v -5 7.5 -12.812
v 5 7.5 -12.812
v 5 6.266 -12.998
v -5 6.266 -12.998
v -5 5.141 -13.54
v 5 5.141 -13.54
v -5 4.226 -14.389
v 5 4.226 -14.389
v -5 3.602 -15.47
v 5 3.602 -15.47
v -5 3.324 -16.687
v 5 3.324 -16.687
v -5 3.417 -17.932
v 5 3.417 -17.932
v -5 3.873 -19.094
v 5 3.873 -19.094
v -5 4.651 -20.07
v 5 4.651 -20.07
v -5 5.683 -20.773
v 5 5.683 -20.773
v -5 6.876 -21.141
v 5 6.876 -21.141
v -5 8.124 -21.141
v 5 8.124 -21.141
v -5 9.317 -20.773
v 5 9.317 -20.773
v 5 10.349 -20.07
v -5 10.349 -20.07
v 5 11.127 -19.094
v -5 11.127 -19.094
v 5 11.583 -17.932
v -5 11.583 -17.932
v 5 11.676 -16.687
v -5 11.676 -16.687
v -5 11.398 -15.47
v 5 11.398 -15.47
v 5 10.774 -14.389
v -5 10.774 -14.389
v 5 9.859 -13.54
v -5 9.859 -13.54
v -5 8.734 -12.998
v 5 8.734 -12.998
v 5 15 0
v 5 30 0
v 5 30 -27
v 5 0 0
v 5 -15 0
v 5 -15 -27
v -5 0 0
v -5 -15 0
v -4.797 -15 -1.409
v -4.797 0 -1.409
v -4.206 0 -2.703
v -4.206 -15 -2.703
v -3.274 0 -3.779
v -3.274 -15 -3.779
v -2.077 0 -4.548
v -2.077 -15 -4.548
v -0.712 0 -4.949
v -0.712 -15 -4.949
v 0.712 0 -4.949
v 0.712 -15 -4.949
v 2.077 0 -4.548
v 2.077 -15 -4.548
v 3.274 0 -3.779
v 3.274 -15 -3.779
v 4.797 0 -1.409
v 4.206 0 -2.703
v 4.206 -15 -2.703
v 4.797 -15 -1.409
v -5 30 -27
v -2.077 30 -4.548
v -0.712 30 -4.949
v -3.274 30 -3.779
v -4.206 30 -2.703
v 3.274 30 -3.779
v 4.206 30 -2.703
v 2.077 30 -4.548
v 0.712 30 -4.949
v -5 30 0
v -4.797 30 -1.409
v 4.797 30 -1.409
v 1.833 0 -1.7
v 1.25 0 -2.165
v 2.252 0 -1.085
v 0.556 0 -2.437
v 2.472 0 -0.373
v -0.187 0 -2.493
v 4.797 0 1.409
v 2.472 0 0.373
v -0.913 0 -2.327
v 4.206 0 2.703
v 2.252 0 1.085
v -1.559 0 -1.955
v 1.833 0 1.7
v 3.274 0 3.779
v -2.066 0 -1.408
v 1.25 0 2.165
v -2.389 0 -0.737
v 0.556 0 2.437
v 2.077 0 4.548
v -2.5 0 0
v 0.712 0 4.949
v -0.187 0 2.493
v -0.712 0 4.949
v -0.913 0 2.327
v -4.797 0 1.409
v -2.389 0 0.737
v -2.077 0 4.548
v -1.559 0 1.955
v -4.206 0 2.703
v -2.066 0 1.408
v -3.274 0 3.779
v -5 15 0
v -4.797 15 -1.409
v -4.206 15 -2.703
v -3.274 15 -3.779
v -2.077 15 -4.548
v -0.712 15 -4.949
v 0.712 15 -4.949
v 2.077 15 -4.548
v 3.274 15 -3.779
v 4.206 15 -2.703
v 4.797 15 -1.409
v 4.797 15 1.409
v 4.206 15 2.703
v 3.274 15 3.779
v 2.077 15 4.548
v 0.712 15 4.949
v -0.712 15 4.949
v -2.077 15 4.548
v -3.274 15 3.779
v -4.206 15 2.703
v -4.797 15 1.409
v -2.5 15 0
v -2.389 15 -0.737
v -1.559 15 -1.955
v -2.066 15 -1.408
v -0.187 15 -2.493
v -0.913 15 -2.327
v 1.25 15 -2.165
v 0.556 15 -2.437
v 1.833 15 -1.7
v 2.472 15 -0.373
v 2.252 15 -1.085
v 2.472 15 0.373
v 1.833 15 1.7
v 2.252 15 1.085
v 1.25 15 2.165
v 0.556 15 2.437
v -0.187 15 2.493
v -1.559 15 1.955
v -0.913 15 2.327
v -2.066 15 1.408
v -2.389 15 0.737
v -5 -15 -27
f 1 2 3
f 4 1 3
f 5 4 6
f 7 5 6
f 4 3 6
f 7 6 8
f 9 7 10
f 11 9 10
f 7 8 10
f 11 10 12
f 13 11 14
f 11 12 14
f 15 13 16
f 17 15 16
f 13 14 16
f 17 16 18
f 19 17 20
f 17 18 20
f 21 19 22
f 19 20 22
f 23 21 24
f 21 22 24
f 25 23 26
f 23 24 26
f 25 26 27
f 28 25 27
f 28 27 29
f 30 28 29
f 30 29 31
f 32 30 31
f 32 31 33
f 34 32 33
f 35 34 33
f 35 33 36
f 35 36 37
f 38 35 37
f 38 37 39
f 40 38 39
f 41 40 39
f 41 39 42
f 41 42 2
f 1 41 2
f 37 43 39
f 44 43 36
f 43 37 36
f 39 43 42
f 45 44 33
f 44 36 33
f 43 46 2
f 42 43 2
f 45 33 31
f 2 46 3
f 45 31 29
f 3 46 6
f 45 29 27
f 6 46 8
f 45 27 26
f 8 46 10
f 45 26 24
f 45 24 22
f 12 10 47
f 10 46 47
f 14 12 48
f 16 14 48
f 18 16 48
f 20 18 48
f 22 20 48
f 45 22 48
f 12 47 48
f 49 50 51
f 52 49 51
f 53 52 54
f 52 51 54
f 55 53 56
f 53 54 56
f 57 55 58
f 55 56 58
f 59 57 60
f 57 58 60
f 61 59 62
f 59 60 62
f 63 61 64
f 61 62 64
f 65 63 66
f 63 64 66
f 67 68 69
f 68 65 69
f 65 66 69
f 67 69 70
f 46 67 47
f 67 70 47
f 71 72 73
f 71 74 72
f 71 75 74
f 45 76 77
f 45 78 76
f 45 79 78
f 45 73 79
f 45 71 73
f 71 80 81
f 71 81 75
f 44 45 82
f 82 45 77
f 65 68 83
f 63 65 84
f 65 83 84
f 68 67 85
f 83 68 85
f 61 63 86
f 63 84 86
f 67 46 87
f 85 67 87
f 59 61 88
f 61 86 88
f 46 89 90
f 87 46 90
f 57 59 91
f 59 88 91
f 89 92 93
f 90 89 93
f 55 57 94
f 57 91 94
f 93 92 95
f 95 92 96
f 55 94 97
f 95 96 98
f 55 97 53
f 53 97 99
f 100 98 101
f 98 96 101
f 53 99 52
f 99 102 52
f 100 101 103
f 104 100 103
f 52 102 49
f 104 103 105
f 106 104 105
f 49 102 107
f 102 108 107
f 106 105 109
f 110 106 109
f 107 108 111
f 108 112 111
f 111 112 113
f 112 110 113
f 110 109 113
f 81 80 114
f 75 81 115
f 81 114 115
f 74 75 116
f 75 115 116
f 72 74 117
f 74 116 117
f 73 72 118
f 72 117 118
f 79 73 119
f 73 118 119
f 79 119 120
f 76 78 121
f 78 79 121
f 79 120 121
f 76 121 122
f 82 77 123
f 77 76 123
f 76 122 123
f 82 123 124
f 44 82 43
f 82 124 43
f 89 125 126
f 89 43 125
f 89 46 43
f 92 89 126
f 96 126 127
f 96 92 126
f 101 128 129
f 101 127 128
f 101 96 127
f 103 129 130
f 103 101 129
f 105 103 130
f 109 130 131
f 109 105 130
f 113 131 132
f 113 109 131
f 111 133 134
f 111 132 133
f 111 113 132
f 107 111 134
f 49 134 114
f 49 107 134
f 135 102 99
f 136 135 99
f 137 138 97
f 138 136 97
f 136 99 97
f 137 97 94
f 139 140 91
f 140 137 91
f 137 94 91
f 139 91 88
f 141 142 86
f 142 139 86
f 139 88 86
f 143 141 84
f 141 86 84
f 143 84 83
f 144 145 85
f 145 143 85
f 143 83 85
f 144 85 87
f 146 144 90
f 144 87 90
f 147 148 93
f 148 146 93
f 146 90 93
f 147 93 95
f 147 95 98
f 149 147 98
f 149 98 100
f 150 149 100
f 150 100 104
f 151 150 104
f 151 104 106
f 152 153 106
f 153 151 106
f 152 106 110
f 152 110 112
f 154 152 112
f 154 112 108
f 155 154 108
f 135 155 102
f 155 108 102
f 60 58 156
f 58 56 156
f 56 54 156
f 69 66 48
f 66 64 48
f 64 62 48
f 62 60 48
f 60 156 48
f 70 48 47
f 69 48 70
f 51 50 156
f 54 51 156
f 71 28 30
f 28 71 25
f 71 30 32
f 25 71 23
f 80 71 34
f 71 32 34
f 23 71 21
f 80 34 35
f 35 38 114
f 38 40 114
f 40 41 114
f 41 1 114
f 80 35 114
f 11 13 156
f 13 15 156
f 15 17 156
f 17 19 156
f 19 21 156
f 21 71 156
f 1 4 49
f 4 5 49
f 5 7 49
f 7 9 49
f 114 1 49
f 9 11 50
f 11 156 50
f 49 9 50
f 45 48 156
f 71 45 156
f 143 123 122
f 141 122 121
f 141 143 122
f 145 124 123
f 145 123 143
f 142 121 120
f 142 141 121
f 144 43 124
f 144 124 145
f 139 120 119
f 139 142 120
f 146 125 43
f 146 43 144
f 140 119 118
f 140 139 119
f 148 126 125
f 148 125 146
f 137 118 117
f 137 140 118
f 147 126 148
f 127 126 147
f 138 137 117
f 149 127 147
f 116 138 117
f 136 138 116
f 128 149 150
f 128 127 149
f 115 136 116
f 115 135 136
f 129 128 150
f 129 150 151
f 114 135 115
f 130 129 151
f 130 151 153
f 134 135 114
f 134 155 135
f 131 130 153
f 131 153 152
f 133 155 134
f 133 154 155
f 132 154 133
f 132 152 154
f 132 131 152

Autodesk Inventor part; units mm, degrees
ref_plane "YZ Plane" through (0, 0, 0) normal (1, 0, 0) x (0, 1, 0)
ref_plane "XZ Plane" through (0, 0, 0) normal (0, 1, 0) x (-1, 0, 0)
ref_plane "XY Plane" through (0, 0, 0) normal (0, 0, 1) x (1, 0, 0)
sketch "草图1" plane through (0, 0, 0) normal (0, 1, 0) x (-1, 0, 0)
  circle A0 centre (0, 0) radius 5
  circle A1 centre (0, 0) radius 2.5
  dimension "d0" = 10
  dimension "d1" = 5
extrude "拉伸1" add sketch "草图1" along normal blind 15
ref_plane "工作平面1" through (0, 7.5, 0) normal (0, 1, 0) x (1, 0, 0)
sketch "草图2" plane through (0, 7.5, 0) normal (0, 1, 0) x (1, 0, 0)
  line L0 (-5, 7) -> (5, 7)
  line L1 (5, 7) -> (5, 27)
  line L2 (5, 27) -> (-5, 27)
  line L3 (-5, 27) -> (-5, 7)
  circle A0 centre (0, 0) radius 5
  circle A1 centre (0, 0) radius 5 projected
  line L4 (5, 0) -> (5, 7)
  circle A2 centre (0, 0) radius 5 projected
  line L5 (-5, 0) -> (-5, 7)
  dimension "d4" = 10
  dimension "d5" = 20
  dimension "d6" = 7
  dimension "d7" = 10
  dimension "d8" = 5
extrude "拉伸2" add sketch "草图2" along normal mid plane 45 contours L3 L2 L1 L0 | L0 L4 A0 L5
sketch "草图3" plane through (-5, -15, -27) normal (-1, 0, 0) x (0, 0, 1)
  line L0 (27, 0) -> (0, 0) projected
  line L1 (0, 0) -> (0, 45) projected
  point P0 (27, 15)
  point P1 (10, 22.5)
  dimension "d11" = 22.5
  dimension "d12" = 10
hole "孔1" at (-5, 7.5, -17) direction (1, 0, 0) diameter 8.376 depth 27.3 thread size "M10x1.5" designation "M10" class "6H" standard "GB Metric profile"
properties part number "连接块2"
